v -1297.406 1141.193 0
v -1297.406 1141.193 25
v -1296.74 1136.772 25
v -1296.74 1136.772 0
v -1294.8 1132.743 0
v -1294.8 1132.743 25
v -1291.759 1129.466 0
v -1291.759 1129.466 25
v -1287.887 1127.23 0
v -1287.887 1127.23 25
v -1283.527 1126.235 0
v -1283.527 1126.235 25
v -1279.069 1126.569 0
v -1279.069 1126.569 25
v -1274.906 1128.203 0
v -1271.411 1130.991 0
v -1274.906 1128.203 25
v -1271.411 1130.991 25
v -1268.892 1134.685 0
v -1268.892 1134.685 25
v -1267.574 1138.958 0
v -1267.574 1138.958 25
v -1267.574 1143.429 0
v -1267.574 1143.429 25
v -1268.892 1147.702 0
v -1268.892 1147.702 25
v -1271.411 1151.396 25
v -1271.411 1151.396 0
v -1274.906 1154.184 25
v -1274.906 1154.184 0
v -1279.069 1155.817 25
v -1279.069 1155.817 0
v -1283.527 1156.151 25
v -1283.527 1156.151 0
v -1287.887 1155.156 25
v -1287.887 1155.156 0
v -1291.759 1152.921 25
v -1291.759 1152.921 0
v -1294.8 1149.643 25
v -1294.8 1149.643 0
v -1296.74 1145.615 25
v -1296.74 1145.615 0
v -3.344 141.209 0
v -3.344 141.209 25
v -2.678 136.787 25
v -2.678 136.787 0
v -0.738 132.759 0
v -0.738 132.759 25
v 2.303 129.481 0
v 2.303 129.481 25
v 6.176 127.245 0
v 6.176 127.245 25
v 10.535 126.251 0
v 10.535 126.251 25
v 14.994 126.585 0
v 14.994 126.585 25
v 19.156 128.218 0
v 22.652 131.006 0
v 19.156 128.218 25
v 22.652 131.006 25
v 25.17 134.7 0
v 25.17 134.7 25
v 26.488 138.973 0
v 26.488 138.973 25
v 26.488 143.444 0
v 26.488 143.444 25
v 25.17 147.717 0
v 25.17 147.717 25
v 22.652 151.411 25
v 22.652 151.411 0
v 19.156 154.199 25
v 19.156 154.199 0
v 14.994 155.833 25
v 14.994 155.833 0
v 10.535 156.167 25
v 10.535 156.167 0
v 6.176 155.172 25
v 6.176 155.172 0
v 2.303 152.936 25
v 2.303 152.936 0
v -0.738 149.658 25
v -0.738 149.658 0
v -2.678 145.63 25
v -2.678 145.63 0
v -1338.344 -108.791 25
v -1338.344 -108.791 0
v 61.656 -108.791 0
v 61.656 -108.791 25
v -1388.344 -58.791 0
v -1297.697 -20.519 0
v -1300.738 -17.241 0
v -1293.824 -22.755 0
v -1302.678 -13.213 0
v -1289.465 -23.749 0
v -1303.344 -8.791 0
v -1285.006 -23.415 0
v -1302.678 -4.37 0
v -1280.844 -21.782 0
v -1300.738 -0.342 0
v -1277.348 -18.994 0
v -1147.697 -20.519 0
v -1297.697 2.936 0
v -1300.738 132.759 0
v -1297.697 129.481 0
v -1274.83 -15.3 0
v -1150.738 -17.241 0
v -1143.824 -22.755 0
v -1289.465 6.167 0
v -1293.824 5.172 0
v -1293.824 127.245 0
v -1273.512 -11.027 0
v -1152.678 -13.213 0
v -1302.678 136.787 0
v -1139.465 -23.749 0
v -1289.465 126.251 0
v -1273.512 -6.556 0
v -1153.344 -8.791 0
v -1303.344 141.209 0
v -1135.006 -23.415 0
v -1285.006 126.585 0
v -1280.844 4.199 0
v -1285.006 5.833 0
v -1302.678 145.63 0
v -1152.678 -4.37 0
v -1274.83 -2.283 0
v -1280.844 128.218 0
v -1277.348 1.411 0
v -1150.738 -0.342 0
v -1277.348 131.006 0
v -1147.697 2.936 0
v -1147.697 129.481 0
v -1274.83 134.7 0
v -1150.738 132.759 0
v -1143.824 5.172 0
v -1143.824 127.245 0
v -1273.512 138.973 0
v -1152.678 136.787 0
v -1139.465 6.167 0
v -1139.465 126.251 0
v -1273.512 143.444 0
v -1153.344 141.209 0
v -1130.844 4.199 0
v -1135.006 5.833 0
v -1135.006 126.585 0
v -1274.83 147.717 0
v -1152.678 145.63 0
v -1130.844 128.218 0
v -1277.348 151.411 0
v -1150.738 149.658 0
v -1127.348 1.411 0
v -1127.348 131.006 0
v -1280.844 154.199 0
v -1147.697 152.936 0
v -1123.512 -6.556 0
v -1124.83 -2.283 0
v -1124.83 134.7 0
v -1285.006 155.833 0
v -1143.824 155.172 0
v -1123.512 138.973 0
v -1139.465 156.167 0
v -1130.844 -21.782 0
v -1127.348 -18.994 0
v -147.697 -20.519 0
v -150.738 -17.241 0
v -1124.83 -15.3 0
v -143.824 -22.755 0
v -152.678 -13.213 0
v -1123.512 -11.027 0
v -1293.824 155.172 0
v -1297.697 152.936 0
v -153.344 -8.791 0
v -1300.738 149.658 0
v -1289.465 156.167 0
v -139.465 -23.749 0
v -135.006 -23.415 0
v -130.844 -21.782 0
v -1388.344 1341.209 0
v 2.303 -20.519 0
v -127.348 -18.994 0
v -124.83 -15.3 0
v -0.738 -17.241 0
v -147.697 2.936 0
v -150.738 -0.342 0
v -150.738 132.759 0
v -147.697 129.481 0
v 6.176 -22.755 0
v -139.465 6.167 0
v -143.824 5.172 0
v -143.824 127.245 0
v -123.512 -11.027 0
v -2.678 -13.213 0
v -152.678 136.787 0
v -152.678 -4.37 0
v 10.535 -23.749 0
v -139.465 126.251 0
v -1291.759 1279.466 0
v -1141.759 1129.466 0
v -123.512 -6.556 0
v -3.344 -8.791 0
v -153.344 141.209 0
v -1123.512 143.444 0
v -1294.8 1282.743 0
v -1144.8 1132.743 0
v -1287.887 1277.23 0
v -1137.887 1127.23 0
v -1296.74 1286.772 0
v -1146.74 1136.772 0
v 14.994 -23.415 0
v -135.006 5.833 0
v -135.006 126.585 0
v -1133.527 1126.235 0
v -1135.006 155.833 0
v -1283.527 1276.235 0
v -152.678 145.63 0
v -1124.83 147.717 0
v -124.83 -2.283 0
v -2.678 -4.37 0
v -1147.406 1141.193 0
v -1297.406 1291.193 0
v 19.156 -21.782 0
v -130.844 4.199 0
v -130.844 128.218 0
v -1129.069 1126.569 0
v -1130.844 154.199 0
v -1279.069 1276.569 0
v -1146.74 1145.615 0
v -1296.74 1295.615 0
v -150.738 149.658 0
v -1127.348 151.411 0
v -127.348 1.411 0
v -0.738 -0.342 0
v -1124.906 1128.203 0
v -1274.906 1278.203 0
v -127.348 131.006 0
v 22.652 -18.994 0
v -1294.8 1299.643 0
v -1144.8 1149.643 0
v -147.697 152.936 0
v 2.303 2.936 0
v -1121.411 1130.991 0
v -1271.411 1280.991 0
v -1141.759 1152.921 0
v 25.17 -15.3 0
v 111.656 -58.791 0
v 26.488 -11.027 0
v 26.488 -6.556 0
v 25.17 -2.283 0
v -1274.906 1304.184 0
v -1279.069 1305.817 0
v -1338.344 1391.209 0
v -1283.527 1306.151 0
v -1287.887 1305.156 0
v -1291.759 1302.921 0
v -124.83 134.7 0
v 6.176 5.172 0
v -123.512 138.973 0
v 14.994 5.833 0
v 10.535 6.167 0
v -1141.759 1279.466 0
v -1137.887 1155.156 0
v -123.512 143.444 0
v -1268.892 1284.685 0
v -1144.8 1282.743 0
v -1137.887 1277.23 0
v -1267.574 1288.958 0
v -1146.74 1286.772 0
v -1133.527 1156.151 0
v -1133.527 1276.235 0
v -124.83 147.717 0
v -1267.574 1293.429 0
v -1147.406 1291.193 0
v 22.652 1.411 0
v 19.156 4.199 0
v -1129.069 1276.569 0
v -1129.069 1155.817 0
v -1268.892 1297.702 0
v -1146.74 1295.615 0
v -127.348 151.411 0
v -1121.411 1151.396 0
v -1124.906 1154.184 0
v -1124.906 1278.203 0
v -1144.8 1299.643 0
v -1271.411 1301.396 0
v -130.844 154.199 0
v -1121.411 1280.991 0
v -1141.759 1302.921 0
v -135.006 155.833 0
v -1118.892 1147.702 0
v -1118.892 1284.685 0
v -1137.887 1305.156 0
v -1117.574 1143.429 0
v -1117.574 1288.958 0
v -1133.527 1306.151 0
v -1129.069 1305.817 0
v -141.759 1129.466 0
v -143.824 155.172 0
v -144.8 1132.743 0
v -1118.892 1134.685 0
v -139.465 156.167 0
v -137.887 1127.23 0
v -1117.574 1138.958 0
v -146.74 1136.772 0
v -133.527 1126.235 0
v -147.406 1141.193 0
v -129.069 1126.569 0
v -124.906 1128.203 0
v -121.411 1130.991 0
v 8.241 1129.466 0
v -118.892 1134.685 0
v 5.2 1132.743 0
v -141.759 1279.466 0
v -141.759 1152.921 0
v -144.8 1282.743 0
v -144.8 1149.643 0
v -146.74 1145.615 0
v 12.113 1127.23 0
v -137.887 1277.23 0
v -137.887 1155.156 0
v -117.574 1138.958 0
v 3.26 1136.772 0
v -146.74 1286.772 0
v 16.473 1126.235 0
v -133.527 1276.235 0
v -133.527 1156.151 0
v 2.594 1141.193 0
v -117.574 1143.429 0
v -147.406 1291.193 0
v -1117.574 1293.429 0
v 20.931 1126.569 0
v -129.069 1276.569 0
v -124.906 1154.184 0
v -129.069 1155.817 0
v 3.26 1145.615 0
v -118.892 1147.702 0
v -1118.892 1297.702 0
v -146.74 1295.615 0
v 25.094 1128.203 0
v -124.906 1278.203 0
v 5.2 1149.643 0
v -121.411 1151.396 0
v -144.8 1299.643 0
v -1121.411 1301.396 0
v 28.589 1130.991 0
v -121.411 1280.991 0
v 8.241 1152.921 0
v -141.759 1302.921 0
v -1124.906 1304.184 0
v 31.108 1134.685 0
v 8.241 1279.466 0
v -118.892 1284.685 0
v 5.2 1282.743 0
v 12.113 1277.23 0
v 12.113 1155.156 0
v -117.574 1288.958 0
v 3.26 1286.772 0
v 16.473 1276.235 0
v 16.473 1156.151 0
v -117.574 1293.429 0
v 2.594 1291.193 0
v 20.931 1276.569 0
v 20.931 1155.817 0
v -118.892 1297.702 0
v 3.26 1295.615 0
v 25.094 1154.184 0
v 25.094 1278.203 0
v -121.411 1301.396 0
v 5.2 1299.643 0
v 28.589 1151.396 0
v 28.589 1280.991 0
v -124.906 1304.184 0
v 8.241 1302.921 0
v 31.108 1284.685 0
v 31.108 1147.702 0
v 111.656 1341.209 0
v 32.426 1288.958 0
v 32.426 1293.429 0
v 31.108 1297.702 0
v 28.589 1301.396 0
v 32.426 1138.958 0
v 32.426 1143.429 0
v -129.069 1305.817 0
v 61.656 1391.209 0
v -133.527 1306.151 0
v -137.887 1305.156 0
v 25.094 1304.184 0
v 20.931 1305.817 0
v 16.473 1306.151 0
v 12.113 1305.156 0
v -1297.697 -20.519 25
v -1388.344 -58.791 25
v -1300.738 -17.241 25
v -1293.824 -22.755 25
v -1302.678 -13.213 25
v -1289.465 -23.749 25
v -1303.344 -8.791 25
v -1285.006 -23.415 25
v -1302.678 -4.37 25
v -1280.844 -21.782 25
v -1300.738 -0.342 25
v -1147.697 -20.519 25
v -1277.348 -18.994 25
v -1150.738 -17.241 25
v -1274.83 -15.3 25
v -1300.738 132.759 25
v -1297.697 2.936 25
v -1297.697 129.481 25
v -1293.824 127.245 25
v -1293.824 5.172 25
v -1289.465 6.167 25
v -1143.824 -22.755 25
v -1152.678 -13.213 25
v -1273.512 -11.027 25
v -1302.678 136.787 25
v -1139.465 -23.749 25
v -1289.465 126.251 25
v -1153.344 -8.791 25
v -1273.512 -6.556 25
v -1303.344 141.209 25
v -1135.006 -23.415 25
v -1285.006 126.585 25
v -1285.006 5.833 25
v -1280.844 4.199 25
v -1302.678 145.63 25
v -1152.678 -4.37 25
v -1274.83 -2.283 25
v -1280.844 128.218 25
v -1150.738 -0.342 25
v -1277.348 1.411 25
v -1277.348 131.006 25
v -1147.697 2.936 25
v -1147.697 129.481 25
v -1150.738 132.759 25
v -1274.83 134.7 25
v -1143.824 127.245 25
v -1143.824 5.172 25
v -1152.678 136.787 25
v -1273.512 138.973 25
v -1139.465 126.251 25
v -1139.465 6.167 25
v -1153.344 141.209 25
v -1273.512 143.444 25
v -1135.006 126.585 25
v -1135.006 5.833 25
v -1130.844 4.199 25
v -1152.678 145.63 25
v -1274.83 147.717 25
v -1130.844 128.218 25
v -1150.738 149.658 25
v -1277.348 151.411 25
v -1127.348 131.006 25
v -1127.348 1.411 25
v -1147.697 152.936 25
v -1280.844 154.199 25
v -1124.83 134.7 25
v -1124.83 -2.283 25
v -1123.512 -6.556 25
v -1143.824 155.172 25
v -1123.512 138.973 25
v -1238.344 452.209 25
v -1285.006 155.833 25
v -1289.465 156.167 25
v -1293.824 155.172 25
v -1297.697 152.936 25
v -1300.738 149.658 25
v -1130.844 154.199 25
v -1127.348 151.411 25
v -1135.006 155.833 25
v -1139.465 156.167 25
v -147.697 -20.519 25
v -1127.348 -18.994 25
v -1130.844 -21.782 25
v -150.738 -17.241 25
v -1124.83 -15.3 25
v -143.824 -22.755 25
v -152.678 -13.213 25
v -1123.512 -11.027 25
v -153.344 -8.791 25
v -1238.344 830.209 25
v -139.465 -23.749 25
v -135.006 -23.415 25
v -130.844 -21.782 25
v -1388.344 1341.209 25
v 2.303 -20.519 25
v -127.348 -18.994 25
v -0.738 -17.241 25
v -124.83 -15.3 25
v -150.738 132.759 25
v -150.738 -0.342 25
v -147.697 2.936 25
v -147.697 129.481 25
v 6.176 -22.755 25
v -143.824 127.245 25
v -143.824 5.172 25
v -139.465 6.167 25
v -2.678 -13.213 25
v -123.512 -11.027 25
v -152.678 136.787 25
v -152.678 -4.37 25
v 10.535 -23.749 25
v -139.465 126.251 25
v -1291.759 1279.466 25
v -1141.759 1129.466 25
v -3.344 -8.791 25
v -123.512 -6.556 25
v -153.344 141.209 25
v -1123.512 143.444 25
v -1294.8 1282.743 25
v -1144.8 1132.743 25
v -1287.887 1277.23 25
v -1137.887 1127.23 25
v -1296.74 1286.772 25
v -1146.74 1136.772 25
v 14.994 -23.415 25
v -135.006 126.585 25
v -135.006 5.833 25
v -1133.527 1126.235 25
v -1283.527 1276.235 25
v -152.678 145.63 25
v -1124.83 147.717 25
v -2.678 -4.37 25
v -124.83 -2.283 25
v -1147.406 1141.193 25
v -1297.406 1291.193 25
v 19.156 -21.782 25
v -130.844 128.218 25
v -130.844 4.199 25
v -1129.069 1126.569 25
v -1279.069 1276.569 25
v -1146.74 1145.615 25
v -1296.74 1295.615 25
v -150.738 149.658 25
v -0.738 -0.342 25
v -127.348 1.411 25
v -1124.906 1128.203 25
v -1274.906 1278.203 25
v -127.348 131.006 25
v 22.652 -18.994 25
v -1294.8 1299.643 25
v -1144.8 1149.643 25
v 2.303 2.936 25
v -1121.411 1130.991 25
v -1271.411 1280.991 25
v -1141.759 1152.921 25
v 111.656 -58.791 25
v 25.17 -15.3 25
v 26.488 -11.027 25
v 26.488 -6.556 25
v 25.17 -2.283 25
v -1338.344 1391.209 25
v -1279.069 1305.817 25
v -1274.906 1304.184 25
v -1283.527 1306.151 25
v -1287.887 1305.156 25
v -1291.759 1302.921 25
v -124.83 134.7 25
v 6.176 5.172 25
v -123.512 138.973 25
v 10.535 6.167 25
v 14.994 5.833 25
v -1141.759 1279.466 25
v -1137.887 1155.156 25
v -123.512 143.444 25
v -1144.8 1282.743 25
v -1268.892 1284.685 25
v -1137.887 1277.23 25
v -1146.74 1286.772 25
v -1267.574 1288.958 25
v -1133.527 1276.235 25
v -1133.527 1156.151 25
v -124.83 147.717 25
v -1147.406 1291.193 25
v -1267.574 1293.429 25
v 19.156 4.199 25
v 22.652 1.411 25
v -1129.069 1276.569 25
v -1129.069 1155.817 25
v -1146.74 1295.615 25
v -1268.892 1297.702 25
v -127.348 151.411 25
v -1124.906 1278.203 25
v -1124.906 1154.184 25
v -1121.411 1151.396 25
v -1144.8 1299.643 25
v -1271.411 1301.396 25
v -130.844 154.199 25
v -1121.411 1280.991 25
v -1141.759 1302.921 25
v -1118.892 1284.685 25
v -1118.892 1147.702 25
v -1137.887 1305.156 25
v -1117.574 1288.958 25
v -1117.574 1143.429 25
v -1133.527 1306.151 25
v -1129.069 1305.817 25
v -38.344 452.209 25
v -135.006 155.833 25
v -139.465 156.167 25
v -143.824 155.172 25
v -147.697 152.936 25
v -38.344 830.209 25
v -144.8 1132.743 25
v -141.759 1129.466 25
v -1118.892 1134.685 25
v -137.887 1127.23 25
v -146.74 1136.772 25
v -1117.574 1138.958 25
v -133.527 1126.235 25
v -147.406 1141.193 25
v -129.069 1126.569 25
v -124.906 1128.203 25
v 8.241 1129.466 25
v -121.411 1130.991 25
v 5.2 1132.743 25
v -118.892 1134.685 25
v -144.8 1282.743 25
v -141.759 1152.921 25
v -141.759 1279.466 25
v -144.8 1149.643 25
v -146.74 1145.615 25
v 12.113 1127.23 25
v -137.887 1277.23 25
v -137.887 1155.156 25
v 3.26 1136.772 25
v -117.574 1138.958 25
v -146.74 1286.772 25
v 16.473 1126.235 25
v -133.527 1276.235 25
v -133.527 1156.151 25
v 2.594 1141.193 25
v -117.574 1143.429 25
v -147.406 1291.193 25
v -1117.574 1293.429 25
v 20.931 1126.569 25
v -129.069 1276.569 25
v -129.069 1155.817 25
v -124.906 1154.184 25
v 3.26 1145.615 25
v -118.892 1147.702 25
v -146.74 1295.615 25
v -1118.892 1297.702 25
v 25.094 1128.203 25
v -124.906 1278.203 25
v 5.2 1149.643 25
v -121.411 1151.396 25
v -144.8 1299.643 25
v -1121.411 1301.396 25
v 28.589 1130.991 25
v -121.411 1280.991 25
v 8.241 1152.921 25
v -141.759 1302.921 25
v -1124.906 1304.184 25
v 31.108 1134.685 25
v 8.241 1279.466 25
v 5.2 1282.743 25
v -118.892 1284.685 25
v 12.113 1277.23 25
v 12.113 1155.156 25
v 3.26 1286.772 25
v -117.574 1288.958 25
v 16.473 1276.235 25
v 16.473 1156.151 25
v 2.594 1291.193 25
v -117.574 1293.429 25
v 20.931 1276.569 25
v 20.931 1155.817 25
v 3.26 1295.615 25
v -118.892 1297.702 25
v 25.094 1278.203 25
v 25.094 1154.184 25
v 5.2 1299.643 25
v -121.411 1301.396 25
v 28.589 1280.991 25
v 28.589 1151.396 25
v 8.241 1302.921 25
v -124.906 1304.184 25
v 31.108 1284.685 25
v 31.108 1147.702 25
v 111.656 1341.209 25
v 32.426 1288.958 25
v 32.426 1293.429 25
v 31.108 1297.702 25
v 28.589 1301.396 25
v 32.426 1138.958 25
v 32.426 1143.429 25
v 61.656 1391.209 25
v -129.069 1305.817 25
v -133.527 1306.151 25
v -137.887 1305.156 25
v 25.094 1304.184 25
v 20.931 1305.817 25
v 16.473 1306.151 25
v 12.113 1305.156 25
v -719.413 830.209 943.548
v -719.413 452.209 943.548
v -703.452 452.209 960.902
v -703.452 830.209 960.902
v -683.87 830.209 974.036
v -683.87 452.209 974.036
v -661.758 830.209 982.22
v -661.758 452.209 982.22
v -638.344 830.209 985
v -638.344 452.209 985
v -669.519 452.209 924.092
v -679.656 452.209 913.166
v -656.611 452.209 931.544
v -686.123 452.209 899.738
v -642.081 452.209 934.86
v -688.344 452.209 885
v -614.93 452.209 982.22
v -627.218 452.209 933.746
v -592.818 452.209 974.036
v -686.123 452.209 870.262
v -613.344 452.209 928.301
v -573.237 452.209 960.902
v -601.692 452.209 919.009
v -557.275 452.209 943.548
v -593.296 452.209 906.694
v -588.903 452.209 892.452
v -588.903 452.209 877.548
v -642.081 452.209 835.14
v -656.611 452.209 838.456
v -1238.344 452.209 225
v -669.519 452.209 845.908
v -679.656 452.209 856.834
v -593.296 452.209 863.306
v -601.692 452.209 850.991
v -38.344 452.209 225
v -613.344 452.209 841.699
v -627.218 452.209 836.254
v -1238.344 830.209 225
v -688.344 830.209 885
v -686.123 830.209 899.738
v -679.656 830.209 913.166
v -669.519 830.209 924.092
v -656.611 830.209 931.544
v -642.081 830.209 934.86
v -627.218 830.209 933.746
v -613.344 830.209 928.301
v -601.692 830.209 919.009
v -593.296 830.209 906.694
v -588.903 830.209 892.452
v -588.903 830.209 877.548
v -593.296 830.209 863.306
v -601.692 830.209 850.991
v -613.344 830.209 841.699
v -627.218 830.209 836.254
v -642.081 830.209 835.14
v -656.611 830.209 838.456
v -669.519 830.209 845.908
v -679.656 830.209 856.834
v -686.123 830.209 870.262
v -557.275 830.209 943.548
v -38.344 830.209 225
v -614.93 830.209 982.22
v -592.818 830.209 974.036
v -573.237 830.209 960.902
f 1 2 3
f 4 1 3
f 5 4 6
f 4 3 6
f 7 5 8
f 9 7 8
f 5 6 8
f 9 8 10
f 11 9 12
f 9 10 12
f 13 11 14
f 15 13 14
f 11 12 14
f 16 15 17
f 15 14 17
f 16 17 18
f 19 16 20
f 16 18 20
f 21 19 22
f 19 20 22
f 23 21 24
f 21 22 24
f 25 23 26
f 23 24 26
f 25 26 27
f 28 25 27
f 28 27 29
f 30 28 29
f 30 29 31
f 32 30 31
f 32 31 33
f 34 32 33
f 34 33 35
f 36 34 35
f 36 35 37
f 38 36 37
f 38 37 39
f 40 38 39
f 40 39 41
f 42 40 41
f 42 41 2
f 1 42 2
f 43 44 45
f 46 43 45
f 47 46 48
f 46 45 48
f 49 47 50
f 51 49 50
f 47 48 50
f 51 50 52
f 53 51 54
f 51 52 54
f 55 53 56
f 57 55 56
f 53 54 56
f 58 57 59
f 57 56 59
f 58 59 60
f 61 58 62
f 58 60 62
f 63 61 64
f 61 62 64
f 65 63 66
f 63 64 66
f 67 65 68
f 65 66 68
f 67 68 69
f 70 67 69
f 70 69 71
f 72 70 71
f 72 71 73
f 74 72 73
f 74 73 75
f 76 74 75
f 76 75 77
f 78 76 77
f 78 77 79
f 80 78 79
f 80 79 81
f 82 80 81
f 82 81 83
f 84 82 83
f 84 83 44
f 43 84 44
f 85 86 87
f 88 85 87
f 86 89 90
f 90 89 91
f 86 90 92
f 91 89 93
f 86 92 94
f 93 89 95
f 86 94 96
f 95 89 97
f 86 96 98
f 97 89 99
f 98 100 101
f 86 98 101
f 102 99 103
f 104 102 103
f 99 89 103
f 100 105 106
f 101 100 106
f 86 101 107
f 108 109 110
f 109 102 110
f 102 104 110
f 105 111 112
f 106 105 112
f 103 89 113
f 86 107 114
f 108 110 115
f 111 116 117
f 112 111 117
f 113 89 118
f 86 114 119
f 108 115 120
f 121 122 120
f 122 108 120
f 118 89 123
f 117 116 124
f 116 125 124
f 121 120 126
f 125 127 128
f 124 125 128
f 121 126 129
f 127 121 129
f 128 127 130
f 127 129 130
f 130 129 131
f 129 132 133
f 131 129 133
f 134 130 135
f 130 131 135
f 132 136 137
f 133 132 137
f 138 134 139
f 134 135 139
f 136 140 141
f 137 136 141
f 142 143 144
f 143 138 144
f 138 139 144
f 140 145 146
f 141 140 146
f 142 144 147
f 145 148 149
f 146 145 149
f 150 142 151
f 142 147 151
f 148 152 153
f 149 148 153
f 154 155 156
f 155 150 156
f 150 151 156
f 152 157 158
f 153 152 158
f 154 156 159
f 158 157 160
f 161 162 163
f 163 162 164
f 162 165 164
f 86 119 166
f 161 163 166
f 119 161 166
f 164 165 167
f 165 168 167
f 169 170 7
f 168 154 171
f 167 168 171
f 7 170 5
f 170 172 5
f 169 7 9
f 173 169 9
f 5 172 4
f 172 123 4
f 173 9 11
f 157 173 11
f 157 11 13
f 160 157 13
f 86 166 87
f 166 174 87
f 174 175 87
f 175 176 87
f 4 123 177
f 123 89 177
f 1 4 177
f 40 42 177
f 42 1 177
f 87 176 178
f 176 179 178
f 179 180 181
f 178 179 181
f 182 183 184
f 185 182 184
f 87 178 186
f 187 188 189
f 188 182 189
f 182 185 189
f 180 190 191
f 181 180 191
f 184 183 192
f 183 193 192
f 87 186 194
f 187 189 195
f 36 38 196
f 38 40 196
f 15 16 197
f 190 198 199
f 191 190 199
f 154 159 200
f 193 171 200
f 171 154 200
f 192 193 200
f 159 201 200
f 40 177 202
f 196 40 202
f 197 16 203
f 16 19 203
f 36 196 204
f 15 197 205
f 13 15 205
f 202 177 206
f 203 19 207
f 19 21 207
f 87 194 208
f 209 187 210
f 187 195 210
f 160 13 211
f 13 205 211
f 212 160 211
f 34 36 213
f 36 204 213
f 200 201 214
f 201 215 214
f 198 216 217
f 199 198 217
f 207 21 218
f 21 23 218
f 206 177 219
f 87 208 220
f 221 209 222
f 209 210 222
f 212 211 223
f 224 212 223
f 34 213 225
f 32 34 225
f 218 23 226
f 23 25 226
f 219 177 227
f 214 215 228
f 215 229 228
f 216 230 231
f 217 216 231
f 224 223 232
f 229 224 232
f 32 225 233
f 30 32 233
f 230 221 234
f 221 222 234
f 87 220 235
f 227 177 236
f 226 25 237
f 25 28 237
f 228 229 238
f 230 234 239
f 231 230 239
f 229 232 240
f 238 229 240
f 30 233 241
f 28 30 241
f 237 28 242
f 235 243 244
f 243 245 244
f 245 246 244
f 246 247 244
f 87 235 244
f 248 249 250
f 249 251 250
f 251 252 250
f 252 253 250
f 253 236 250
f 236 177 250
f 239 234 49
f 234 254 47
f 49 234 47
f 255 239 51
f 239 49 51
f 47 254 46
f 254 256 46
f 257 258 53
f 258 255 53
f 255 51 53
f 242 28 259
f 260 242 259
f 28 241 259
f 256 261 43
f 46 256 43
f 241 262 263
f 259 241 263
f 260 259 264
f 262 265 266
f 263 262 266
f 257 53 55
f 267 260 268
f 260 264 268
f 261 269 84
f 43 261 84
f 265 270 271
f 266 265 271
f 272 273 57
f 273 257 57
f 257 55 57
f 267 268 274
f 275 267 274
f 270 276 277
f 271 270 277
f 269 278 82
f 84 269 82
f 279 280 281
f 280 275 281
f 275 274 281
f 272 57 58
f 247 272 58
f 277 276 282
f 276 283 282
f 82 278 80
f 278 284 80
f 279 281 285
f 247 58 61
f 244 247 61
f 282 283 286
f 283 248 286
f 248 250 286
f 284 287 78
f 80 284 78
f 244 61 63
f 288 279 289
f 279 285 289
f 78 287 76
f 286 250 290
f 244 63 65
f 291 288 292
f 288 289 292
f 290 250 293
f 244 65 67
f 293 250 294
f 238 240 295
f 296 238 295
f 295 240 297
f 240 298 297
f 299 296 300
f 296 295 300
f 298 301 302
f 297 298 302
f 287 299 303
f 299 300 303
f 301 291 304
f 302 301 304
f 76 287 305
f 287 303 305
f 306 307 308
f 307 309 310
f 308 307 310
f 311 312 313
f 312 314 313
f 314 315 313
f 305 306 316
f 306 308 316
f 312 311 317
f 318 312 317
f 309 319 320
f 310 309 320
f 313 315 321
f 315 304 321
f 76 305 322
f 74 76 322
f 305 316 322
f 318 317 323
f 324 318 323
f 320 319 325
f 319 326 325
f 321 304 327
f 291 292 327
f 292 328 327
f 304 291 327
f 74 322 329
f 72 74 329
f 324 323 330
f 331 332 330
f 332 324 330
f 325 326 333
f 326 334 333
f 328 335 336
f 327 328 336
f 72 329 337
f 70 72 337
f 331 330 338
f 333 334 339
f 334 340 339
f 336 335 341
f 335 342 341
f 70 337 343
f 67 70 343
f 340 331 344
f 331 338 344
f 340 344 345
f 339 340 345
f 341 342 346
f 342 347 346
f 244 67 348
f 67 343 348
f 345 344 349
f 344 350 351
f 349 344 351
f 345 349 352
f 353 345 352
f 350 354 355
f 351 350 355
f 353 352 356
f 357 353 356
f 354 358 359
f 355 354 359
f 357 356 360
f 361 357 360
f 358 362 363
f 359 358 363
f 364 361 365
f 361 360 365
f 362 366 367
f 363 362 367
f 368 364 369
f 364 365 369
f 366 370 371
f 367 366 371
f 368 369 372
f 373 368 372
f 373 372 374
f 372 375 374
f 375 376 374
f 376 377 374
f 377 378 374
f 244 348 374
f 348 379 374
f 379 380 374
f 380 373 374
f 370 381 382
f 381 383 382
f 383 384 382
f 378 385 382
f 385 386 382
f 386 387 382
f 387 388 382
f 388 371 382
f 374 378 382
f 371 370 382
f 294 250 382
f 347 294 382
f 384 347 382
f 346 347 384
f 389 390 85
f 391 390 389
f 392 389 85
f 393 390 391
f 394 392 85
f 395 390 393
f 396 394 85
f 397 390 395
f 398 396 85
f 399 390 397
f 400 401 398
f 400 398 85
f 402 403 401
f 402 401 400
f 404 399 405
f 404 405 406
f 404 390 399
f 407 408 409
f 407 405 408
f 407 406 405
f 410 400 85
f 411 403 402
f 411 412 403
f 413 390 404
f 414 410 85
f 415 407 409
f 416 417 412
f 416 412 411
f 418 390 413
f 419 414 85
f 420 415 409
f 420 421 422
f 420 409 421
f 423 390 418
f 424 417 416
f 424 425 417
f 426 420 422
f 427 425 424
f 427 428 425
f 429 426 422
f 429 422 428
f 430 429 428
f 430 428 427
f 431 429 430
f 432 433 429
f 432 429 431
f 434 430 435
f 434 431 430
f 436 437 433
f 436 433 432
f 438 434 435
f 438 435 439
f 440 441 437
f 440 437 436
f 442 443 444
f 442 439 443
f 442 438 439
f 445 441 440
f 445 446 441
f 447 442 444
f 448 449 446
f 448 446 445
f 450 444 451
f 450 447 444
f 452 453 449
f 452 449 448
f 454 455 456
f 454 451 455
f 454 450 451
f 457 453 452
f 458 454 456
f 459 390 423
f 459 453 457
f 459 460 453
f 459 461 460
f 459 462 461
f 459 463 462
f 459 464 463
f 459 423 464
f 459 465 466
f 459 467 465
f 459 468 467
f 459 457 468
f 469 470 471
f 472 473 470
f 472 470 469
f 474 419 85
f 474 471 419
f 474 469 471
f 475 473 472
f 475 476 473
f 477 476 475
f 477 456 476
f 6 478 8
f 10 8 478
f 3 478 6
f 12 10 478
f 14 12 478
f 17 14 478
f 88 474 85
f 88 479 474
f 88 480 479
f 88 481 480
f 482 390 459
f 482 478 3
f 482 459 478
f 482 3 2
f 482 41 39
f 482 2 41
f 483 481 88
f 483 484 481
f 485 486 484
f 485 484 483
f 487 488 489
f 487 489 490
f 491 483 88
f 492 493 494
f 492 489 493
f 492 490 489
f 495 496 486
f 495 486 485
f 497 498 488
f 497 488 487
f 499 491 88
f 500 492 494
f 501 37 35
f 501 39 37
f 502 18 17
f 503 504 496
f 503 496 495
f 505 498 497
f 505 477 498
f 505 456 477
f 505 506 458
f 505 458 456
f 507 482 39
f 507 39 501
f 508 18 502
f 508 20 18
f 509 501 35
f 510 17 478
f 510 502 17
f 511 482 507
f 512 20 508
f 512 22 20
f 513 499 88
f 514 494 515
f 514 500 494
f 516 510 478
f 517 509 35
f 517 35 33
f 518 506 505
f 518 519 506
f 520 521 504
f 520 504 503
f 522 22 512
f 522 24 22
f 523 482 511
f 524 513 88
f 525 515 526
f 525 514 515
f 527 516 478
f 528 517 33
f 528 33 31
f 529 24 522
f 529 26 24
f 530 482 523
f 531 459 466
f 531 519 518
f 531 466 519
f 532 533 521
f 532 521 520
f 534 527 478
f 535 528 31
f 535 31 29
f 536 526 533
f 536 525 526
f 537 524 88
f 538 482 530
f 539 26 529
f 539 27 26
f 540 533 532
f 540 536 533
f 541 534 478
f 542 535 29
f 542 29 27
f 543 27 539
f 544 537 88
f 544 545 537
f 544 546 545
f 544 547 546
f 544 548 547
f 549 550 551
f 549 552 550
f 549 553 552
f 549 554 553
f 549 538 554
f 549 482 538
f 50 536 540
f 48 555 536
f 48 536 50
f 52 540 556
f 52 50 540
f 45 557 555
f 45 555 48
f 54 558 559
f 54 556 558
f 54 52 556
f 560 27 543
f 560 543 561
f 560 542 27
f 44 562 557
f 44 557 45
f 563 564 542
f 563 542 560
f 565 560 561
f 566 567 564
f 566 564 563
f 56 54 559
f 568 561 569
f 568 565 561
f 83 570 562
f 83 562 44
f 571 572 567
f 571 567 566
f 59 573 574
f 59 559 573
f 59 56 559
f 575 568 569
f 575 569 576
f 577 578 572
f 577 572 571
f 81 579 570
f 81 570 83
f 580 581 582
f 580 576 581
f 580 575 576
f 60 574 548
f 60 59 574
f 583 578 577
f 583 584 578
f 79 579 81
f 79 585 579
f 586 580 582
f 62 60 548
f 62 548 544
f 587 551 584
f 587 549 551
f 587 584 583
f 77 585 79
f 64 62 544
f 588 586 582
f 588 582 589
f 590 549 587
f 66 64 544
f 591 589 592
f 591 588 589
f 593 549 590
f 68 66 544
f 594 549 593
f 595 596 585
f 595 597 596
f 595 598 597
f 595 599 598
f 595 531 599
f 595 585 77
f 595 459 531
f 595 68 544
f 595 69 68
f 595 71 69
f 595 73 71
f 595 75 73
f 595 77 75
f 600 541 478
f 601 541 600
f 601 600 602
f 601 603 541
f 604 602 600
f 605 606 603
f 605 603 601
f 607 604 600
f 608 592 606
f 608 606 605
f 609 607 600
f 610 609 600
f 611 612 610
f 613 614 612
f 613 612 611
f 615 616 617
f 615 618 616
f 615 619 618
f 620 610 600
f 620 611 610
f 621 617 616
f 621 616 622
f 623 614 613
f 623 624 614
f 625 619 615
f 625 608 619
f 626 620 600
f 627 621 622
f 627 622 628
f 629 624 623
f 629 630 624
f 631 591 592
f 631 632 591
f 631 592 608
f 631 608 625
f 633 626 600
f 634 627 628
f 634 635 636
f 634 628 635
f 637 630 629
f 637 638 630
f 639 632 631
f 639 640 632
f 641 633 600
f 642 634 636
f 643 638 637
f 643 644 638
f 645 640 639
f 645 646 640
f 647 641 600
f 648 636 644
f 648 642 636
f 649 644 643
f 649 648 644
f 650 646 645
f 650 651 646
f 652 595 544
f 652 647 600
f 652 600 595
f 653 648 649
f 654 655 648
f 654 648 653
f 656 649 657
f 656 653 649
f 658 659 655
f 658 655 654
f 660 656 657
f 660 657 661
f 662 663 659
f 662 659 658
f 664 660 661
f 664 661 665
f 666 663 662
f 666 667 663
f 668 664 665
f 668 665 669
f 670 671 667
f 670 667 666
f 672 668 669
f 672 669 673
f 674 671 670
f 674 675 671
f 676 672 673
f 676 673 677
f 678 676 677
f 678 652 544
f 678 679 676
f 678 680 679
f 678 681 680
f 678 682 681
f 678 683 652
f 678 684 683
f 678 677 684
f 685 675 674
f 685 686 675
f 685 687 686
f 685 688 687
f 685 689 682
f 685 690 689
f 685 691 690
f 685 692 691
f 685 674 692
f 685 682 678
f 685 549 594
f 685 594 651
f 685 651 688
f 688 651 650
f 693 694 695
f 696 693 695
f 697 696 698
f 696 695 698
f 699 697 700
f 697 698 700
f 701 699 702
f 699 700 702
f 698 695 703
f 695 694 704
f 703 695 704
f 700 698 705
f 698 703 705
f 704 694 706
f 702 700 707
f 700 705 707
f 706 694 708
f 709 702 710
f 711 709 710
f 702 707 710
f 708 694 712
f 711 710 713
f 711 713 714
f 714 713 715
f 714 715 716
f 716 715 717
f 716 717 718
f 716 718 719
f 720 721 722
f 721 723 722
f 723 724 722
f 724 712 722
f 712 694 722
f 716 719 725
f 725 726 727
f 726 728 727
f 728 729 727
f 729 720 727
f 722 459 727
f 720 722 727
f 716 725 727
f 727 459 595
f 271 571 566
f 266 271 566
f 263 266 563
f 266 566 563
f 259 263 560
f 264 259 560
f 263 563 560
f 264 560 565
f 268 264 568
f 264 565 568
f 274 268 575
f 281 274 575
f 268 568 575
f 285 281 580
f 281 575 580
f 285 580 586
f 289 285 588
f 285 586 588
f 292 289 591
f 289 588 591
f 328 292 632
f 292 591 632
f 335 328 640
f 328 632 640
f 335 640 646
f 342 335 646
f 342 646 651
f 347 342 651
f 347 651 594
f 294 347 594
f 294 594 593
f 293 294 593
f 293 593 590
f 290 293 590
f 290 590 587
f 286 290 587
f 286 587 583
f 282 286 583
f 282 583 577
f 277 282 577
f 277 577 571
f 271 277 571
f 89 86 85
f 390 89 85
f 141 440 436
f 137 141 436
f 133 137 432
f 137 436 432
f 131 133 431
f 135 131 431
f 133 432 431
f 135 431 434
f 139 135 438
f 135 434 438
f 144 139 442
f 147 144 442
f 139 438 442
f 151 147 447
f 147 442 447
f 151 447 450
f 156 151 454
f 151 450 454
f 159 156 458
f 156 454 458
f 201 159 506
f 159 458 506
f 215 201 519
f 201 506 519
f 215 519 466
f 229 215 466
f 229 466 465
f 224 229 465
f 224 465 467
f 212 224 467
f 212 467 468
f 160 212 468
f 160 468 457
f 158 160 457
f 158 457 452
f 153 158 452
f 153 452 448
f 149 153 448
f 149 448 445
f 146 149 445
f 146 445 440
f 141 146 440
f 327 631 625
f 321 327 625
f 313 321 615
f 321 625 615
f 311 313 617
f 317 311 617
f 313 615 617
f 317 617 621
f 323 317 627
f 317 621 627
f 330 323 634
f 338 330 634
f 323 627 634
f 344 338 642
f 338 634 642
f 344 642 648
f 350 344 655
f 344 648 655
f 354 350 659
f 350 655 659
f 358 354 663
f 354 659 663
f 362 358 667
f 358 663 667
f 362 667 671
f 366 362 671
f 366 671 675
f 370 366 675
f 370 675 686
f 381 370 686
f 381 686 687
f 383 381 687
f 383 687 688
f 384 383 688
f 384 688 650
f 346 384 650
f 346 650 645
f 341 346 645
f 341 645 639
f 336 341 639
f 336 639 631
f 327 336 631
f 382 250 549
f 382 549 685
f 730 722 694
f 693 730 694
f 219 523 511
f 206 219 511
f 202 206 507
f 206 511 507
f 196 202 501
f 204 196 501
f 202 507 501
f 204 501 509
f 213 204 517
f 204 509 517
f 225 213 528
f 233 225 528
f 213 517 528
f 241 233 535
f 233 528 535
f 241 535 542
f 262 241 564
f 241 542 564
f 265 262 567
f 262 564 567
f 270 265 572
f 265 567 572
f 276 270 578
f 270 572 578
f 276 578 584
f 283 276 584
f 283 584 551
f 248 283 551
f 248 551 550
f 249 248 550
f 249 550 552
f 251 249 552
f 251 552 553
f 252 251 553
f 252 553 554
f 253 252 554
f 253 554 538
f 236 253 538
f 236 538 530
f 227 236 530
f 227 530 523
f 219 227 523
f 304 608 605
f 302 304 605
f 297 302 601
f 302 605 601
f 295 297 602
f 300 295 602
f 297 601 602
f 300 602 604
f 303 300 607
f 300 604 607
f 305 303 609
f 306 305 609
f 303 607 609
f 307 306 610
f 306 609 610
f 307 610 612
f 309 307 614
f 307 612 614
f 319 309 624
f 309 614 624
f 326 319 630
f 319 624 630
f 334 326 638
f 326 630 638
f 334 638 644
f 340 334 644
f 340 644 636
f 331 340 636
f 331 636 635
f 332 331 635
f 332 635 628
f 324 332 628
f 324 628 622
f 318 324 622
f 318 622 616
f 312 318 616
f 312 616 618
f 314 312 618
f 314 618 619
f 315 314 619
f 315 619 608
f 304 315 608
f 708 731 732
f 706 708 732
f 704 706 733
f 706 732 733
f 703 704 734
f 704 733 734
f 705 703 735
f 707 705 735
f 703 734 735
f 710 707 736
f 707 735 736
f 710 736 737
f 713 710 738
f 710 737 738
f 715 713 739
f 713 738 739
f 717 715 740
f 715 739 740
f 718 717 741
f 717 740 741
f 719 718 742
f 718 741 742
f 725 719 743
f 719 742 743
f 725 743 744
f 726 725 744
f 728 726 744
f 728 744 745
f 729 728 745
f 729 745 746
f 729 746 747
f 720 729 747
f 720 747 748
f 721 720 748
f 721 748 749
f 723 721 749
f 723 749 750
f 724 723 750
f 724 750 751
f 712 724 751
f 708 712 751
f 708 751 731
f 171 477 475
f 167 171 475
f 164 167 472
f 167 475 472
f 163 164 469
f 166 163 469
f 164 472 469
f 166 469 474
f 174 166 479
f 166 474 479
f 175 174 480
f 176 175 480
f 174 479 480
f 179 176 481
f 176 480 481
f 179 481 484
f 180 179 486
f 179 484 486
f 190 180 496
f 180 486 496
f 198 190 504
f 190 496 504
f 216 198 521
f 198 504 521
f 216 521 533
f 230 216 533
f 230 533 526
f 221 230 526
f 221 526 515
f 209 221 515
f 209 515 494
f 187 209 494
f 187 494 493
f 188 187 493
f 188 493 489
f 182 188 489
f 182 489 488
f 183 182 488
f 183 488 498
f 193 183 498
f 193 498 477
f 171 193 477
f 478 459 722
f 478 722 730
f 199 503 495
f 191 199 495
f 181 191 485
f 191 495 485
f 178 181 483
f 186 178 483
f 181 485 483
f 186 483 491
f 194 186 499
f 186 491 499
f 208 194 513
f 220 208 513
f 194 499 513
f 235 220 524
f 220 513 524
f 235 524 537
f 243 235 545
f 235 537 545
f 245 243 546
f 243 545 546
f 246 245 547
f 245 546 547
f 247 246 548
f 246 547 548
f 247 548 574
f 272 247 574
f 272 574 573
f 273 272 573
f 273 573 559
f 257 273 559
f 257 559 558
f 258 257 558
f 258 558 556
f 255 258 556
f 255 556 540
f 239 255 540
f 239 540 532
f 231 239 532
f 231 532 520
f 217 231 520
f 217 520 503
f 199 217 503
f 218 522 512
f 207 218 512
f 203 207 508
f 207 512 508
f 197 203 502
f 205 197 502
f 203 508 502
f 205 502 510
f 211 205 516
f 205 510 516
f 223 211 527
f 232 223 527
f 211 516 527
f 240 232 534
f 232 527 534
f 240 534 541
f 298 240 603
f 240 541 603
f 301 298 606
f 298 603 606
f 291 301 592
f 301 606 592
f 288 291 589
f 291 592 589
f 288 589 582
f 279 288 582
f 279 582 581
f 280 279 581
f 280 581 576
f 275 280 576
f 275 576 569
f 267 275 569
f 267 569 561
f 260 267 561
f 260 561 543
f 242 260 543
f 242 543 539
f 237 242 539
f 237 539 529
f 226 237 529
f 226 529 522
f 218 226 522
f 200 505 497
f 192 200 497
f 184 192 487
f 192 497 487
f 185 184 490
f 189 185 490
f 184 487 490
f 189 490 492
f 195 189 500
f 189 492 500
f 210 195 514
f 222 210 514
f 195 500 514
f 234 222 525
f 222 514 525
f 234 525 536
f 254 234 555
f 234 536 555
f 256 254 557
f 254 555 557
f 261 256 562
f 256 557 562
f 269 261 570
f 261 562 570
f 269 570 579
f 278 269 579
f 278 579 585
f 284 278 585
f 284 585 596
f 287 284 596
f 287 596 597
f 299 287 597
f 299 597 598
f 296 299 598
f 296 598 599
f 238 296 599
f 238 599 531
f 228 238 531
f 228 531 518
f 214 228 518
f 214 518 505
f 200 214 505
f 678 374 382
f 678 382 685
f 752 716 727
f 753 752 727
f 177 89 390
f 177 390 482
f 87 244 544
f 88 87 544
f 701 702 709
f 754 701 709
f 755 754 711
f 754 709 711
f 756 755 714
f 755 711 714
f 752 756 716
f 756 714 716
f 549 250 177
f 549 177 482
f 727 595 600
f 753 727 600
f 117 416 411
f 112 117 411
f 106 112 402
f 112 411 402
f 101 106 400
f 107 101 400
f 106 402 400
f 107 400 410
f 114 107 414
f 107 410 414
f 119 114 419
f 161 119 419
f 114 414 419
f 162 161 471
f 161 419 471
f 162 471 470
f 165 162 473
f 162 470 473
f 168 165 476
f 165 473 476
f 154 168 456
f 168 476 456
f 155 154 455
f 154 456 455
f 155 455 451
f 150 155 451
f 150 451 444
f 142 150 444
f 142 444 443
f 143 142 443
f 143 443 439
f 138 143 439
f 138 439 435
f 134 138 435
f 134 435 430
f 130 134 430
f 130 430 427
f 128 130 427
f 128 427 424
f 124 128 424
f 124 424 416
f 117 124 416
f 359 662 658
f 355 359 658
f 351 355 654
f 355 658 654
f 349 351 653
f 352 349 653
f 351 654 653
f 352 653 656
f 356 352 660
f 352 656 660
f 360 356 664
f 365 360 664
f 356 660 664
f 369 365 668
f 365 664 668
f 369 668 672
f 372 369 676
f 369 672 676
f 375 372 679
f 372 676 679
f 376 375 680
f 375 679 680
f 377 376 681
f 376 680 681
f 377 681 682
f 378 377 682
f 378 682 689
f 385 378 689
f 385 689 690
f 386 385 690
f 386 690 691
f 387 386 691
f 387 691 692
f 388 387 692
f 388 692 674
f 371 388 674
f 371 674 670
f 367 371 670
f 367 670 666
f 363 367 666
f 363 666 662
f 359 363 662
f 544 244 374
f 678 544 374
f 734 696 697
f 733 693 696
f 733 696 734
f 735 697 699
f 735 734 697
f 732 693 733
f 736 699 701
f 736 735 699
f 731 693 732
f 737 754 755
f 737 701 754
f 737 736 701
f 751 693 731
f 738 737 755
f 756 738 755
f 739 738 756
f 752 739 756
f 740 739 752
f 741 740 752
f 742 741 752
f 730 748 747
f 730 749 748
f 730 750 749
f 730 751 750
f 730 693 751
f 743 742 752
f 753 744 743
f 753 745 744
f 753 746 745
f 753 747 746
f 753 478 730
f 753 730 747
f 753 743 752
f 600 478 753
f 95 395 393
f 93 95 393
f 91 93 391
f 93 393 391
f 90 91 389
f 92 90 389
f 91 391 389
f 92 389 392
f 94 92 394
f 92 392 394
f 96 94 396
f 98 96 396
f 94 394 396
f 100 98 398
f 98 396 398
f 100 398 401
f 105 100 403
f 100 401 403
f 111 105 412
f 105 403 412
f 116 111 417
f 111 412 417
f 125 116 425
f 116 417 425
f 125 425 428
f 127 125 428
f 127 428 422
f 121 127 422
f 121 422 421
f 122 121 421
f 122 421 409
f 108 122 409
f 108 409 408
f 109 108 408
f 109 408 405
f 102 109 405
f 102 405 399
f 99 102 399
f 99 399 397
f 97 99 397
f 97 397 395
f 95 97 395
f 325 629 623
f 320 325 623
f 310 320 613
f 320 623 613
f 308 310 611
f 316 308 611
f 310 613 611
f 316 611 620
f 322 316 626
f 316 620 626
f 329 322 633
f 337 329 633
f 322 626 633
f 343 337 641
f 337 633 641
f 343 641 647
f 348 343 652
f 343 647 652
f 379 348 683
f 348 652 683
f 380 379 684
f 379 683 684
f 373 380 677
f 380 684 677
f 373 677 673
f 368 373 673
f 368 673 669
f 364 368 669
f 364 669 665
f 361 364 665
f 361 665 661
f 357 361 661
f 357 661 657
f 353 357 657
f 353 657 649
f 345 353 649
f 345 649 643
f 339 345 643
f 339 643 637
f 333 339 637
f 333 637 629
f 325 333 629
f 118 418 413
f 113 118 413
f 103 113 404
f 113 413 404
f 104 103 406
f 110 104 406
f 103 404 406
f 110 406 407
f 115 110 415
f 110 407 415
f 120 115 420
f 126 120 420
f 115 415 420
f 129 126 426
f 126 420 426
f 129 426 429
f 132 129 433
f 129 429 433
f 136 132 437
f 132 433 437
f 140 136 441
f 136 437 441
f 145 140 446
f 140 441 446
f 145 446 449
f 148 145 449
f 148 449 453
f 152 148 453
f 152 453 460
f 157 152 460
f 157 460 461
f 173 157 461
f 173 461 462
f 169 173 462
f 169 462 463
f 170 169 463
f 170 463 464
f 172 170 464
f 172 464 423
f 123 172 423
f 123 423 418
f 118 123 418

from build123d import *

# Parameters (mm, degrees)
F0_W     = 1500
F0_H     = 1500
F1_DEPTH = 25
F2_SIZE  = 50
F3_W     = 1200
F3_H     = 378
F4_DEPTH = 960
F6_D     = 100
F8_DEPTH = 532.28619
F10_D    = 30


with BuildPart() as f1:
    # F0 (on Top) → F1 (new body)
    with BuildSketch(Plane.XY):
        with Locations((-638.344221, 641.208582)):
            Rectangle(F0_W, F0_H)
    extrude(amount=F1_DEPTH)

    # F2
    f2_edges = [f1.edges().sort_by_distance(p)[0] for p in [
        (-1388.344221, -108.791418, 12.5),
        (111.655779, -108.791418, 12.5),
        (111.655779, 1391.208582, 12.5),
        (-1388.344221, 1391.208582, 12.5),
    ]]
    chamfer(f2_edges, length=F2_SIZE)

    # F3 (on face) → F4 (join)
    with BuildSketch(Plane.XY.offset(25)):
        with Locations((-638.344221, 641.208582)):
            Rectangle(F3_W, F3_H)
    extrude(amount=F4_DEPTH)

    # F6 (through all)
    with Locations(Plane.XZ.offset(-452.208582)):
        with Locations((-638.344221, 885)):
            Hole(F6_D / 2)

    # F7 (on face) → F8 (cut)
    with BuildSketch(Plane.XZ.offset(-452.208582)):
        with BuildLine():
            Line((-1238.344221, 985), (-1238.344221, 225))
            Line((-1238.344221, 225), (-719.413216, 943.547571))
            ThreePointArc((-719.413216, 943.547571), (-683.870273, 974.035827), (-638.344221, 985))
            Line((-638.344221, 985), (-1238.344221, 985))
        make_face()
        with BuildLine():
            Line((-38.344221, 985), (-638.344221, 985))
            ThreePointArc((-638.344221, 985), (-592.818168, 974.035827), (-557.275226, 943.547571))
            Line((-557.275226, 943.547571), (-38.344221, 225))
            Line((-38.344221, 225), (-38.344221, 985))
        make_face()
    extrude(amount=-F8_DEPTH, mode=Mode.SUBTRACT)

    # F10 (through all)
    with Locations(Plane(origin=(0, 0, 0), x_dir=(1, 0, 0), z_dir=(0, 0, -1))):
        with Locations((-1282.406457, -1291.193252), (-1132.406457, -1291.193252), (-1132.406457, -1141.193252), (-1282.406457, -1141.193252), (-1288.344221, -141.208582), (-1138.344221, -141.208582), (-1138.344221, 8.791418), (-1288.344221, 8.791418), (-138.344221, 8.791418), (11.655779, 8.791418), (11.655779, -141.208582), (-138.344221, -141.208582), (-132.406457, -1141.193252), (17.593543, -1141.193252), (17.593543, -1291.193252), (-132.406457, -1291.193252)):
            Hole(F10_D / 2)


solid = f1.part
